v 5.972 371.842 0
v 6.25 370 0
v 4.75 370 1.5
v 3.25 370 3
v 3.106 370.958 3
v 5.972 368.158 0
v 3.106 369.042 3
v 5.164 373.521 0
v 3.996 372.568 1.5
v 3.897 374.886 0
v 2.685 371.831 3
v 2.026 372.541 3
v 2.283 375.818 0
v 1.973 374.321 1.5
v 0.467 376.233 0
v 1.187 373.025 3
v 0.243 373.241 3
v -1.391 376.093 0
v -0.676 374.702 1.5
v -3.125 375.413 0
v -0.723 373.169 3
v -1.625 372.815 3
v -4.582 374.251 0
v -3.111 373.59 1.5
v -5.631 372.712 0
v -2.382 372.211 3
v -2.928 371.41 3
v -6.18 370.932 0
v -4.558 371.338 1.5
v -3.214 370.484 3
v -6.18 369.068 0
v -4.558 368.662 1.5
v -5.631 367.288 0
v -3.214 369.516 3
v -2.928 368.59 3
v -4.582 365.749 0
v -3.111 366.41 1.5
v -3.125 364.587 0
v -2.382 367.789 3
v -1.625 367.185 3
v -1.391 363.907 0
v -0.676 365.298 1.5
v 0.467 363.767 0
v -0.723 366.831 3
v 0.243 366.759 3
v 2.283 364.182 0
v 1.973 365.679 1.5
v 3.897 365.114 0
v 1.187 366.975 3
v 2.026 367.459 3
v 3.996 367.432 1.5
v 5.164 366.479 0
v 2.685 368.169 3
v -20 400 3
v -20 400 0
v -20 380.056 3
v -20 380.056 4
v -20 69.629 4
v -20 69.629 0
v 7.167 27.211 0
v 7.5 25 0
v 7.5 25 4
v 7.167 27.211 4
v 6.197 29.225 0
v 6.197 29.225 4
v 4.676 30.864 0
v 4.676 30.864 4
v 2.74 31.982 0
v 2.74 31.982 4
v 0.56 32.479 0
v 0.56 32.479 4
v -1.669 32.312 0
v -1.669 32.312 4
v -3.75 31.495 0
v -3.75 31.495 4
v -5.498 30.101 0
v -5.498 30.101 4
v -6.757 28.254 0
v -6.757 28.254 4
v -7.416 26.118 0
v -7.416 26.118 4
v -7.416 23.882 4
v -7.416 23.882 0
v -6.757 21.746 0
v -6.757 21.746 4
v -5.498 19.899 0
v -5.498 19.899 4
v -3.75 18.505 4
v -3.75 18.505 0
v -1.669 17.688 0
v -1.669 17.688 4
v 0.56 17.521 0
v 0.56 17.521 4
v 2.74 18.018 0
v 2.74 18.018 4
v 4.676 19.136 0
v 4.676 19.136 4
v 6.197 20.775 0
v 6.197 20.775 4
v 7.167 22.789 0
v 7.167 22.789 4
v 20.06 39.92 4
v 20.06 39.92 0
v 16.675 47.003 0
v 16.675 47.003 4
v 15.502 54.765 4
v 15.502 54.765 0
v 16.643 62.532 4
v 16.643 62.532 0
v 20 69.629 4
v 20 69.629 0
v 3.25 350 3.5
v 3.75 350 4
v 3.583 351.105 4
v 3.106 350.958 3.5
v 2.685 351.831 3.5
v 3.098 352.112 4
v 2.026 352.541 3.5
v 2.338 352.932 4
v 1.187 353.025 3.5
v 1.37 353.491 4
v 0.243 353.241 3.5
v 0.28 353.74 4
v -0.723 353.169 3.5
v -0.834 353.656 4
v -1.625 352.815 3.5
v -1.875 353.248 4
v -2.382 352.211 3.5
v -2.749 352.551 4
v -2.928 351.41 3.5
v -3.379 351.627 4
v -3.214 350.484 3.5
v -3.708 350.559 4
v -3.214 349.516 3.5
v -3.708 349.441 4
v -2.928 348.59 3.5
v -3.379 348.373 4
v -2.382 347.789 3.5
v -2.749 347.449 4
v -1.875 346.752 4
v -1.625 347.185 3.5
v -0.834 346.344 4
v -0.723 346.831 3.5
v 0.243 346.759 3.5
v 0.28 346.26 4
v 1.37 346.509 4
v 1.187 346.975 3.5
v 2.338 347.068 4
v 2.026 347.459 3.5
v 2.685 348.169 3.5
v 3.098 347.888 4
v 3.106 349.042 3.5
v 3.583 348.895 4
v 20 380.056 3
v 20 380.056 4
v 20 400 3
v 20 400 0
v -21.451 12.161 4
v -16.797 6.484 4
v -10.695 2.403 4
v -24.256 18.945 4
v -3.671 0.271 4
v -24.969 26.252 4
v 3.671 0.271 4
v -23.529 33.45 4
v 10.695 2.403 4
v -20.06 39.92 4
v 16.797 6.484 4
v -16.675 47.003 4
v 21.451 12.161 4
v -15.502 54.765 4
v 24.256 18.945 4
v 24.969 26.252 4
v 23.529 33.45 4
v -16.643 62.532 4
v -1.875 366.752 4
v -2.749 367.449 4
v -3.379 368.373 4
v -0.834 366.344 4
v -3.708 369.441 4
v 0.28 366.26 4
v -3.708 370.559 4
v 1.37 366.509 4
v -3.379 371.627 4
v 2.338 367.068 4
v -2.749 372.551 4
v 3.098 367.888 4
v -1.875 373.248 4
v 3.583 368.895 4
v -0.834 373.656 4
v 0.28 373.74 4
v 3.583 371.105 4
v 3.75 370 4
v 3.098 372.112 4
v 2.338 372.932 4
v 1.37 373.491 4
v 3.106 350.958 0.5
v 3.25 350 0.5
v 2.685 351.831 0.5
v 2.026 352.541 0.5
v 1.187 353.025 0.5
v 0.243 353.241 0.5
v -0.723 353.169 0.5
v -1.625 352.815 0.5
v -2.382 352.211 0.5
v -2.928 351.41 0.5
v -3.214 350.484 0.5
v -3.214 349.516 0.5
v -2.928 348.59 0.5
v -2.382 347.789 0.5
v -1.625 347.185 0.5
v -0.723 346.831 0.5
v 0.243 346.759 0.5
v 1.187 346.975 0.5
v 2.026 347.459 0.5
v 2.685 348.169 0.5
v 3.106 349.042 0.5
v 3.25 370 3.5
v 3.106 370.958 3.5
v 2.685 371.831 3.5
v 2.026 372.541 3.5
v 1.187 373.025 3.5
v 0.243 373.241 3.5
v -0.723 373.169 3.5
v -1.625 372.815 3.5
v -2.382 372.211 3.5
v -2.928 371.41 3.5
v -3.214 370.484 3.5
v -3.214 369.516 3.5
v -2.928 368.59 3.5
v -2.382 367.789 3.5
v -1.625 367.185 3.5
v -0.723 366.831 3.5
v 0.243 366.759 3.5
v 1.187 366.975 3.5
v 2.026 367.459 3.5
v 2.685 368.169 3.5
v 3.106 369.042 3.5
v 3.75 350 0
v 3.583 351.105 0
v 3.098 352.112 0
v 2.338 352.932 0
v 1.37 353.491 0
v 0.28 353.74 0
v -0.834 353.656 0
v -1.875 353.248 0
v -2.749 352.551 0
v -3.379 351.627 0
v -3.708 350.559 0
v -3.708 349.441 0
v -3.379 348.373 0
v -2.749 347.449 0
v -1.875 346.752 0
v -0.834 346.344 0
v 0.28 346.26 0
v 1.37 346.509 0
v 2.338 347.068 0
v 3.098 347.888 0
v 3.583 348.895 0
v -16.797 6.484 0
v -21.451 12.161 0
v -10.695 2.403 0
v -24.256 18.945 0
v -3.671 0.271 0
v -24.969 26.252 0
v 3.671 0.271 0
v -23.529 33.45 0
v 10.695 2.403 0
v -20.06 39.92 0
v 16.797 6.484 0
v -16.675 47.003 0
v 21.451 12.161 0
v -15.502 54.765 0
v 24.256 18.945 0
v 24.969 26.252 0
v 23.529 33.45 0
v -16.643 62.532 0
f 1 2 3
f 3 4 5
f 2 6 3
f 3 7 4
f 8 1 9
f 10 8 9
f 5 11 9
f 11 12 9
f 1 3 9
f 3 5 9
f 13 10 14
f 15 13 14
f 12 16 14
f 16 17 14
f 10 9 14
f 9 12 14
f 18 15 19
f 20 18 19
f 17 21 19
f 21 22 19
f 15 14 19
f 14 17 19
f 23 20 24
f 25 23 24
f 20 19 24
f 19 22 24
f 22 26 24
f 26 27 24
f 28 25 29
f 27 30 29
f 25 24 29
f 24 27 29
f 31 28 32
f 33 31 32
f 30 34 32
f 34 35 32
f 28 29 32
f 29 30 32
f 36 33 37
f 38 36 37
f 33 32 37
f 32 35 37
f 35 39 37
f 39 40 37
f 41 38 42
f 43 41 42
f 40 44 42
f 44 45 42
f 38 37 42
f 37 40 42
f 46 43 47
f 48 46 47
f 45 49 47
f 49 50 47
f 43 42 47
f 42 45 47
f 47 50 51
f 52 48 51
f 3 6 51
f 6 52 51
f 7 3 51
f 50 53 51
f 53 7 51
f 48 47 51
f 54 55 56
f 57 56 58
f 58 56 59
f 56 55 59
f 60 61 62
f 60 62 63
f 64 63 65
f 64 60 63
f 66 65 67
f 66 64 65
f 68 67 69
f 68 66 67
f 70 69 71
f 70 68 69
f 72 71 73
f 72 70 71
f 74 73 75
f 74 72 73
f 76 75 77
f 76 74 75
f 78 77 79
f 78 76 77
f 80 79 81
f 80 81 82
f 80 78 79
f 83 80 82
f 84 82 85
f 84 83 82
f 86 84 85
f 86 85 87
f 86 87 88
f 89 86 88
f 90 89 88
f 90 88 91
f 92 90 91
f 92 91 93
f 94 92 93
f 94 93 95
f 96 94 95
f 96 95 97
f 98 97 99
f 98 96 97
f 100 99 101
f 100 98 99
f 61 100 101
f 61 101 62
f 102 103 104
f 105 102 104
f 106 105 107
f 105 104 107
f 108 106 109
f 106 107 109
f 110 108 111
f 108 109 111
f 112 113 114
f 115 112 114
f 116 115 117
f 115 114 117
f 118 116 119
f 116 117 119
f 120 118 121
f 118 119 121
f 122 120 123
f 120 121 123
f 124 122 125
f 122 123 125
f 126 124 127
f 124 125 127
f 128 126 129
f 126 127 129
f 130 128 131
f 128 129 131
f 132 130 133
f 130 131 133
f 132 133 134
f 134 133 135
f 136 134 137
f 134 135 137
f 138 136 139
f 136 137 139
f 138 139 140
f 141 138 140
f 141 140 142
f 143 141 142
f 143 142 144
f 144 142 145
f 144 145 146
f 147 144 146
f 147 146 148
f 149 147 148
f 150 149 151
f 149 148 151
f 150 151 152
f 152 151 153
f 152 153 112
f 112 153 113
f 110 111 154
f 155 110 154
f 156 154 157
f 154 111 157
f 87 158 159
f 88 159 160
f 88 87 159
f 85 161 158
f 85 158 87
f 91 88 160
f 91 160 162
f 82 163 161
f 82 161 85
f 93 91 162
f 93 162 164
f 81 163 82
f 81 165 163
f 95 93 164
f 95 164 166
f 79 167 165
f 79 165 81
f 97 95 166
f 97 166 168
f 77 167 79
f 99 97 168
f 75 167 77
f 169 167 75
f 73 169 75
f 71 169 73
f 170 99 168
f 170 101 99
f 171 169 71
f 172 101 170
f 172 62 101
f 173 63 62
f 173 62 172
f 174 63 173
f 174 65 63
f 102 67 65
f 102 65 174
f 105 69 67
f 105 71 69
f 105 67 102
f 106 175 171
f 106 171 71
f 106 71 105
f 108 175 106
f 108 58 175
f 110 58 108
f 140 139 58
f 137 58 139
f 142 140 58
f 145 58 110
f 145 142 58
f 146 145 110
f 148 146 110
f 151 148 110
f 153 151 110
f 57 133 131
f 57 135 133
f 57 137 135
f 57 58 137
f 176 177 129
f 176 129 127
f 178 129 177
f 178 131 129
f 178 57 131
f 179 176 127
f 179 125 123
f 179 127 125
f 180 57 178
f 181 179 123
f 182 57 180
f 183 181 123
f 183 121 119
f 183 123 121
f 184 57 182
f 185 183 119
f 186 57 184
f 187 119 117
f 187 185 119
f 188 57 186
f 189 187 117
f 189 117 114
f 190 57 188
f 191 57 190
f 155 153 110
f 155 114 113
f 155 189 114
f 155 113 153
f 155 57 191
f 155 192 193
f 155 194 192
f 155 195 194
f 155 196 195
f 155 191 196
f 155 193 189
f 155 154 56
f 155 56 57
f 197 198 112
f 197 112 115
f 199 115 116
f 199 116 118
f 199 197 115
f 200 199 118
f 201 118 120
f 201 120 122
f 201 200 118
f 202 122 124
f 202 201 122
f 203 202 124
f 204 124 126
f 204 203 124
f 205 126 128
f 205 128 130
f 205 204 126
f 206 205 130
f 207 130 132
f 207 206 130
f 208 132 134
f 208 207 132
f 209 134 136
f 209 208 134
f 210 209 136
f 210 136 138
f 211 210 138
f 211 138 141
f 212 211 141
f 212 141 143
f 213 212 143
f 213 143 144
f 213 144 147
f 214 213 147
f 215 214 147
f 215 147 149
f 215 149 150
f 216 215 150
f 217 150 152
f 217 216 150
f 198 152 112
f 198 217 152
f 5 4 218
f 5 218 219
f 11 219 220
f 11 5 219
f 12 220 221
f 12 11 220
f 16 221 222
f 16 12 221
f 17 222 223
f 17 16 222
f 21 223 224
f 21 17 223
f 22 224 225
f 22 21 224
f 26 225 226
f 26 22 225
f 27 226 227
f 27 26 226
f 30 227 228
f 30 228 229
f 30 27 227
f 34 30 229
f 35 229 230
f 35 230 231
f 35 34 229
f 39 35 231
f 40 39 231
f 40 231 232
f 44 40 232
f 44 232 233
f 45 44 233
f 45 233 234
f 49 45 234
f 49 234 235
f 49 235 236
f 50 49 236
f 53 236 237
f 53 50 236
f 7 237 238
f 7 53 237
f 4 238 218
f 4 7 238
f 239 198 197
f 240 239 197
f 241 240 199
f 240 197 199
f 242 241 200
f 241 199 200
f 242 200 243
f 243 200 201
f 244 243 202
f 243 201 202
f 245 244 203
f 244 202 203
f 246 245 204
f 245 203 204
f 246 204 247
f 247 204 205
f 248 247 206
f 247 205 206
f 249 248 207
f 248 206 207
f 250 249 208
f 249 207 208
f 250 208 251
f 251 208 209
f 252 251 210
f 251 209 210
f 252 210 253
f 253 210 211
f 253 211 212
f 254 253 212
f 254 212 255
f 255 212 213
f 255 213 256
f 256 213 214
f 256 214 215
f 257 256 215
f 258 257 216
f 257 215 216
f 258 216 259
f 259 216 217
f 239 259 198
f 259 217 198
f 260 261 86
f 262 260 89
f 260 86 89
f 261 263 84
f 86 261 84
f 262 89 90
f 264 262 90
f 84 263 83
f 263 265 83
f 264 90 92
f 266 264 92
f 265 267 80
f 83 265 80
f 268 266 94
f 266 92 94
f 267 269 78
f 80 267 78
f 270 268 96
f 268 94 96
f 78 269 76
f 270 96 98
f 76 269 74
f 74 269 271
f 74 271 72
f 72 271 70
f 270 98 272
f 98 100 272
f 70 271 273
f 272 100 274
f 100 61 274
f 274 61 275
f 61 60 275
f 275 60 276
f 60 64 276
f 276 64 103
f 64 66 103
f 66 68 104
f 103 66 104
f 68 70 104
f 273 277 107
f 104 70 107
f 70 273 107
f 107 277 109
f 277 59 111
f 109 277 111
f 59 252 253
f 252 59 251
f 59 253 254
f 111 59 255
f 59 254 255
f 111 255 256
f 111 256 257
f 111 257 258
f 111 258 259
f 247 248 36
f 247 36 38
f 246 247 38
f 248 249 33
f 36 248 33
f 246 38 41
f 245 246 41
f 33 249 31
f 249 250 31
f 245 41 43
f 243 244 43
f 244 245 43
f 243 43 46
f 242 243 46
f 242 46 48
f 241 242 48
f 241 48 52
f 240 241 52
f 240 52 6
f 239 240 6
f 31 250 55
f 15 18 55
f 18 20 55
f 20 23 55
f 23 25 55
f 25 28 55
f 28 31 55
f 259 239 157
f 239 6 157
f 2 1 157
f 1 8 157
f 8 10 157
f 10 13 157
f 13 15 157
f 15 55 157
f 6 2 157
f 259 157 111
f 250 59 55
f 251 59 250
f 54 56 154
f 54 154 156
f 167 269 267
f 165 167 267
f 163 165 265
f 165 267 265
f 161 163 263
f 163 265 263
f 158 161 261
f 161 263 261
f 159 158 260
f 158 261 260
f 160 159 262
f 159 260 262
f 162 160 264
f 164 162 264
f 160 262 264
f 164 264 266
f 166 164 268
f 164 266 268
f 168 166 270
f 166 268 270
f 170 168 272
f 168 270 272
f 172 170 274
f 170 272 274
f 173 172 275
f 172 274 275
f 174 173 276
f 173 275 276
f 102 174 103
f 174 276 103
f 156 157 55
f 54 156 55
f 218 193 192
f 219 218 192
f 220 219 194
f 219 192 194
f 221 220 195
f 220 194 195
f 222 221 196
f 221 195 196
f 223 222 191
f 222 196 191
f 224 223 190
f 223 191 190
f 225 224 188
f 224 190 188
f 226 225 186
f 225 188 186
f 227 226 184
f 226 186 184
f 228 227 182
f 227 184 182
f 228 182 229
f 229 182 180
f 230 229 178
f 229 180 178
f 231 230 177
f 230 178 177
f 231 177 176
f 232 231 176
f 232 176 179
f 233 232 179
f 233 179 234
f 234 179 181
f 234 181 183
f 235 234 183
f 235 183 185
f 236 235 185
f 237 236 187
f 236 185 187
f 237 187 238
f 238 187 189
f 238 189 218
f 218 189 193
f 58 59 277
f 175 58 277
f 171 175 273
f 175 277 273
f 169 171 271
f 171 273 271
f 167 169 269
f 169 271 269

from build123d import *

# Parameters (mm, degrees)
SKETCH_1_R          = 3.25
SKETCH_1_R_2        = 7.5
EXTRUDE_1_DEPTH     = 4
SKETCH_2_W          = 1
SKETCH_2_H          = 19.943647813
CUT_EXTRUDE_1_DEPTH = 46
CHAMFER_1_SIZE      = 3
CHAMFER_2_SIZE      = 0.5


with BuildPart() as part:
    # Эскиз1 → Бобышка-Вытянуть1 (new body)
    with BuildSketch(Plane.XY):
        with BuildLine():
            Line((20, 69.629043508), (20, 400))
            Line((20, 400), (-20, 400))
            Line((-20, 400), (-20, 69.629043508))
            ThreePointArc((-20, 69.629043508), (-15.501661364, 54.765331367), (-20.05985163, 39.919864362))
            ThreePointArc((-20.05985163, 39.919864362), (0, 0), (20.05985163, 39.919864362))
            ThreePointArc((20.05985163, 39.919864362), (15.501661364, 54.765331367), (20, 69.629043508))
        make_face()
        with Locations((0, 370)):
            Circle(SKETCH_1_R, mode=Mode.SUBTRACT)
        with Locations((0, 350)):
            Circle(SKETCH_1_R, mode=Mode.SUBTRACT)
        with Locations((0, 25)):
            Circle(SKETCH_1_R_2, mode=Mode.SUBTRACT)
    extrude(amount=EXTRUDE_1_DEPTH)

    # Эскиз2 → Вырез-Вытянуть1 (cut, through all)
    with BuildSketch(Plane.ZY.offset(20)):
        with Locations((3.5, 390.028176094)):
            Rectangle(SKETCH_2_W, SKETCH_2_H)
    extrude(amount=-CUT_EXTRUDE_1_DEPTH, mode=Mode.SUBTRACT)

    # Фаска1
    chamfer_1_edges = [part.edges().sort_by_distance(p)[0] for p in [
        (-3.25, 370, 0),
    ]]
    chamfer(chamfer_1_edges, length=CHAMFER_1_SIZE)

    # Фаска2
    chamfer_2_edges = [part.edges().sort_by_distance(p)[0] for p in [
        (-3.25, 350, 0),
        (-3.25, 350, 4),
        (-3.25, 370, 4),
    ]]
    chamfer(chamfer_2_edges, length=CHAMFER_2_SIZE)


solid = part.part
